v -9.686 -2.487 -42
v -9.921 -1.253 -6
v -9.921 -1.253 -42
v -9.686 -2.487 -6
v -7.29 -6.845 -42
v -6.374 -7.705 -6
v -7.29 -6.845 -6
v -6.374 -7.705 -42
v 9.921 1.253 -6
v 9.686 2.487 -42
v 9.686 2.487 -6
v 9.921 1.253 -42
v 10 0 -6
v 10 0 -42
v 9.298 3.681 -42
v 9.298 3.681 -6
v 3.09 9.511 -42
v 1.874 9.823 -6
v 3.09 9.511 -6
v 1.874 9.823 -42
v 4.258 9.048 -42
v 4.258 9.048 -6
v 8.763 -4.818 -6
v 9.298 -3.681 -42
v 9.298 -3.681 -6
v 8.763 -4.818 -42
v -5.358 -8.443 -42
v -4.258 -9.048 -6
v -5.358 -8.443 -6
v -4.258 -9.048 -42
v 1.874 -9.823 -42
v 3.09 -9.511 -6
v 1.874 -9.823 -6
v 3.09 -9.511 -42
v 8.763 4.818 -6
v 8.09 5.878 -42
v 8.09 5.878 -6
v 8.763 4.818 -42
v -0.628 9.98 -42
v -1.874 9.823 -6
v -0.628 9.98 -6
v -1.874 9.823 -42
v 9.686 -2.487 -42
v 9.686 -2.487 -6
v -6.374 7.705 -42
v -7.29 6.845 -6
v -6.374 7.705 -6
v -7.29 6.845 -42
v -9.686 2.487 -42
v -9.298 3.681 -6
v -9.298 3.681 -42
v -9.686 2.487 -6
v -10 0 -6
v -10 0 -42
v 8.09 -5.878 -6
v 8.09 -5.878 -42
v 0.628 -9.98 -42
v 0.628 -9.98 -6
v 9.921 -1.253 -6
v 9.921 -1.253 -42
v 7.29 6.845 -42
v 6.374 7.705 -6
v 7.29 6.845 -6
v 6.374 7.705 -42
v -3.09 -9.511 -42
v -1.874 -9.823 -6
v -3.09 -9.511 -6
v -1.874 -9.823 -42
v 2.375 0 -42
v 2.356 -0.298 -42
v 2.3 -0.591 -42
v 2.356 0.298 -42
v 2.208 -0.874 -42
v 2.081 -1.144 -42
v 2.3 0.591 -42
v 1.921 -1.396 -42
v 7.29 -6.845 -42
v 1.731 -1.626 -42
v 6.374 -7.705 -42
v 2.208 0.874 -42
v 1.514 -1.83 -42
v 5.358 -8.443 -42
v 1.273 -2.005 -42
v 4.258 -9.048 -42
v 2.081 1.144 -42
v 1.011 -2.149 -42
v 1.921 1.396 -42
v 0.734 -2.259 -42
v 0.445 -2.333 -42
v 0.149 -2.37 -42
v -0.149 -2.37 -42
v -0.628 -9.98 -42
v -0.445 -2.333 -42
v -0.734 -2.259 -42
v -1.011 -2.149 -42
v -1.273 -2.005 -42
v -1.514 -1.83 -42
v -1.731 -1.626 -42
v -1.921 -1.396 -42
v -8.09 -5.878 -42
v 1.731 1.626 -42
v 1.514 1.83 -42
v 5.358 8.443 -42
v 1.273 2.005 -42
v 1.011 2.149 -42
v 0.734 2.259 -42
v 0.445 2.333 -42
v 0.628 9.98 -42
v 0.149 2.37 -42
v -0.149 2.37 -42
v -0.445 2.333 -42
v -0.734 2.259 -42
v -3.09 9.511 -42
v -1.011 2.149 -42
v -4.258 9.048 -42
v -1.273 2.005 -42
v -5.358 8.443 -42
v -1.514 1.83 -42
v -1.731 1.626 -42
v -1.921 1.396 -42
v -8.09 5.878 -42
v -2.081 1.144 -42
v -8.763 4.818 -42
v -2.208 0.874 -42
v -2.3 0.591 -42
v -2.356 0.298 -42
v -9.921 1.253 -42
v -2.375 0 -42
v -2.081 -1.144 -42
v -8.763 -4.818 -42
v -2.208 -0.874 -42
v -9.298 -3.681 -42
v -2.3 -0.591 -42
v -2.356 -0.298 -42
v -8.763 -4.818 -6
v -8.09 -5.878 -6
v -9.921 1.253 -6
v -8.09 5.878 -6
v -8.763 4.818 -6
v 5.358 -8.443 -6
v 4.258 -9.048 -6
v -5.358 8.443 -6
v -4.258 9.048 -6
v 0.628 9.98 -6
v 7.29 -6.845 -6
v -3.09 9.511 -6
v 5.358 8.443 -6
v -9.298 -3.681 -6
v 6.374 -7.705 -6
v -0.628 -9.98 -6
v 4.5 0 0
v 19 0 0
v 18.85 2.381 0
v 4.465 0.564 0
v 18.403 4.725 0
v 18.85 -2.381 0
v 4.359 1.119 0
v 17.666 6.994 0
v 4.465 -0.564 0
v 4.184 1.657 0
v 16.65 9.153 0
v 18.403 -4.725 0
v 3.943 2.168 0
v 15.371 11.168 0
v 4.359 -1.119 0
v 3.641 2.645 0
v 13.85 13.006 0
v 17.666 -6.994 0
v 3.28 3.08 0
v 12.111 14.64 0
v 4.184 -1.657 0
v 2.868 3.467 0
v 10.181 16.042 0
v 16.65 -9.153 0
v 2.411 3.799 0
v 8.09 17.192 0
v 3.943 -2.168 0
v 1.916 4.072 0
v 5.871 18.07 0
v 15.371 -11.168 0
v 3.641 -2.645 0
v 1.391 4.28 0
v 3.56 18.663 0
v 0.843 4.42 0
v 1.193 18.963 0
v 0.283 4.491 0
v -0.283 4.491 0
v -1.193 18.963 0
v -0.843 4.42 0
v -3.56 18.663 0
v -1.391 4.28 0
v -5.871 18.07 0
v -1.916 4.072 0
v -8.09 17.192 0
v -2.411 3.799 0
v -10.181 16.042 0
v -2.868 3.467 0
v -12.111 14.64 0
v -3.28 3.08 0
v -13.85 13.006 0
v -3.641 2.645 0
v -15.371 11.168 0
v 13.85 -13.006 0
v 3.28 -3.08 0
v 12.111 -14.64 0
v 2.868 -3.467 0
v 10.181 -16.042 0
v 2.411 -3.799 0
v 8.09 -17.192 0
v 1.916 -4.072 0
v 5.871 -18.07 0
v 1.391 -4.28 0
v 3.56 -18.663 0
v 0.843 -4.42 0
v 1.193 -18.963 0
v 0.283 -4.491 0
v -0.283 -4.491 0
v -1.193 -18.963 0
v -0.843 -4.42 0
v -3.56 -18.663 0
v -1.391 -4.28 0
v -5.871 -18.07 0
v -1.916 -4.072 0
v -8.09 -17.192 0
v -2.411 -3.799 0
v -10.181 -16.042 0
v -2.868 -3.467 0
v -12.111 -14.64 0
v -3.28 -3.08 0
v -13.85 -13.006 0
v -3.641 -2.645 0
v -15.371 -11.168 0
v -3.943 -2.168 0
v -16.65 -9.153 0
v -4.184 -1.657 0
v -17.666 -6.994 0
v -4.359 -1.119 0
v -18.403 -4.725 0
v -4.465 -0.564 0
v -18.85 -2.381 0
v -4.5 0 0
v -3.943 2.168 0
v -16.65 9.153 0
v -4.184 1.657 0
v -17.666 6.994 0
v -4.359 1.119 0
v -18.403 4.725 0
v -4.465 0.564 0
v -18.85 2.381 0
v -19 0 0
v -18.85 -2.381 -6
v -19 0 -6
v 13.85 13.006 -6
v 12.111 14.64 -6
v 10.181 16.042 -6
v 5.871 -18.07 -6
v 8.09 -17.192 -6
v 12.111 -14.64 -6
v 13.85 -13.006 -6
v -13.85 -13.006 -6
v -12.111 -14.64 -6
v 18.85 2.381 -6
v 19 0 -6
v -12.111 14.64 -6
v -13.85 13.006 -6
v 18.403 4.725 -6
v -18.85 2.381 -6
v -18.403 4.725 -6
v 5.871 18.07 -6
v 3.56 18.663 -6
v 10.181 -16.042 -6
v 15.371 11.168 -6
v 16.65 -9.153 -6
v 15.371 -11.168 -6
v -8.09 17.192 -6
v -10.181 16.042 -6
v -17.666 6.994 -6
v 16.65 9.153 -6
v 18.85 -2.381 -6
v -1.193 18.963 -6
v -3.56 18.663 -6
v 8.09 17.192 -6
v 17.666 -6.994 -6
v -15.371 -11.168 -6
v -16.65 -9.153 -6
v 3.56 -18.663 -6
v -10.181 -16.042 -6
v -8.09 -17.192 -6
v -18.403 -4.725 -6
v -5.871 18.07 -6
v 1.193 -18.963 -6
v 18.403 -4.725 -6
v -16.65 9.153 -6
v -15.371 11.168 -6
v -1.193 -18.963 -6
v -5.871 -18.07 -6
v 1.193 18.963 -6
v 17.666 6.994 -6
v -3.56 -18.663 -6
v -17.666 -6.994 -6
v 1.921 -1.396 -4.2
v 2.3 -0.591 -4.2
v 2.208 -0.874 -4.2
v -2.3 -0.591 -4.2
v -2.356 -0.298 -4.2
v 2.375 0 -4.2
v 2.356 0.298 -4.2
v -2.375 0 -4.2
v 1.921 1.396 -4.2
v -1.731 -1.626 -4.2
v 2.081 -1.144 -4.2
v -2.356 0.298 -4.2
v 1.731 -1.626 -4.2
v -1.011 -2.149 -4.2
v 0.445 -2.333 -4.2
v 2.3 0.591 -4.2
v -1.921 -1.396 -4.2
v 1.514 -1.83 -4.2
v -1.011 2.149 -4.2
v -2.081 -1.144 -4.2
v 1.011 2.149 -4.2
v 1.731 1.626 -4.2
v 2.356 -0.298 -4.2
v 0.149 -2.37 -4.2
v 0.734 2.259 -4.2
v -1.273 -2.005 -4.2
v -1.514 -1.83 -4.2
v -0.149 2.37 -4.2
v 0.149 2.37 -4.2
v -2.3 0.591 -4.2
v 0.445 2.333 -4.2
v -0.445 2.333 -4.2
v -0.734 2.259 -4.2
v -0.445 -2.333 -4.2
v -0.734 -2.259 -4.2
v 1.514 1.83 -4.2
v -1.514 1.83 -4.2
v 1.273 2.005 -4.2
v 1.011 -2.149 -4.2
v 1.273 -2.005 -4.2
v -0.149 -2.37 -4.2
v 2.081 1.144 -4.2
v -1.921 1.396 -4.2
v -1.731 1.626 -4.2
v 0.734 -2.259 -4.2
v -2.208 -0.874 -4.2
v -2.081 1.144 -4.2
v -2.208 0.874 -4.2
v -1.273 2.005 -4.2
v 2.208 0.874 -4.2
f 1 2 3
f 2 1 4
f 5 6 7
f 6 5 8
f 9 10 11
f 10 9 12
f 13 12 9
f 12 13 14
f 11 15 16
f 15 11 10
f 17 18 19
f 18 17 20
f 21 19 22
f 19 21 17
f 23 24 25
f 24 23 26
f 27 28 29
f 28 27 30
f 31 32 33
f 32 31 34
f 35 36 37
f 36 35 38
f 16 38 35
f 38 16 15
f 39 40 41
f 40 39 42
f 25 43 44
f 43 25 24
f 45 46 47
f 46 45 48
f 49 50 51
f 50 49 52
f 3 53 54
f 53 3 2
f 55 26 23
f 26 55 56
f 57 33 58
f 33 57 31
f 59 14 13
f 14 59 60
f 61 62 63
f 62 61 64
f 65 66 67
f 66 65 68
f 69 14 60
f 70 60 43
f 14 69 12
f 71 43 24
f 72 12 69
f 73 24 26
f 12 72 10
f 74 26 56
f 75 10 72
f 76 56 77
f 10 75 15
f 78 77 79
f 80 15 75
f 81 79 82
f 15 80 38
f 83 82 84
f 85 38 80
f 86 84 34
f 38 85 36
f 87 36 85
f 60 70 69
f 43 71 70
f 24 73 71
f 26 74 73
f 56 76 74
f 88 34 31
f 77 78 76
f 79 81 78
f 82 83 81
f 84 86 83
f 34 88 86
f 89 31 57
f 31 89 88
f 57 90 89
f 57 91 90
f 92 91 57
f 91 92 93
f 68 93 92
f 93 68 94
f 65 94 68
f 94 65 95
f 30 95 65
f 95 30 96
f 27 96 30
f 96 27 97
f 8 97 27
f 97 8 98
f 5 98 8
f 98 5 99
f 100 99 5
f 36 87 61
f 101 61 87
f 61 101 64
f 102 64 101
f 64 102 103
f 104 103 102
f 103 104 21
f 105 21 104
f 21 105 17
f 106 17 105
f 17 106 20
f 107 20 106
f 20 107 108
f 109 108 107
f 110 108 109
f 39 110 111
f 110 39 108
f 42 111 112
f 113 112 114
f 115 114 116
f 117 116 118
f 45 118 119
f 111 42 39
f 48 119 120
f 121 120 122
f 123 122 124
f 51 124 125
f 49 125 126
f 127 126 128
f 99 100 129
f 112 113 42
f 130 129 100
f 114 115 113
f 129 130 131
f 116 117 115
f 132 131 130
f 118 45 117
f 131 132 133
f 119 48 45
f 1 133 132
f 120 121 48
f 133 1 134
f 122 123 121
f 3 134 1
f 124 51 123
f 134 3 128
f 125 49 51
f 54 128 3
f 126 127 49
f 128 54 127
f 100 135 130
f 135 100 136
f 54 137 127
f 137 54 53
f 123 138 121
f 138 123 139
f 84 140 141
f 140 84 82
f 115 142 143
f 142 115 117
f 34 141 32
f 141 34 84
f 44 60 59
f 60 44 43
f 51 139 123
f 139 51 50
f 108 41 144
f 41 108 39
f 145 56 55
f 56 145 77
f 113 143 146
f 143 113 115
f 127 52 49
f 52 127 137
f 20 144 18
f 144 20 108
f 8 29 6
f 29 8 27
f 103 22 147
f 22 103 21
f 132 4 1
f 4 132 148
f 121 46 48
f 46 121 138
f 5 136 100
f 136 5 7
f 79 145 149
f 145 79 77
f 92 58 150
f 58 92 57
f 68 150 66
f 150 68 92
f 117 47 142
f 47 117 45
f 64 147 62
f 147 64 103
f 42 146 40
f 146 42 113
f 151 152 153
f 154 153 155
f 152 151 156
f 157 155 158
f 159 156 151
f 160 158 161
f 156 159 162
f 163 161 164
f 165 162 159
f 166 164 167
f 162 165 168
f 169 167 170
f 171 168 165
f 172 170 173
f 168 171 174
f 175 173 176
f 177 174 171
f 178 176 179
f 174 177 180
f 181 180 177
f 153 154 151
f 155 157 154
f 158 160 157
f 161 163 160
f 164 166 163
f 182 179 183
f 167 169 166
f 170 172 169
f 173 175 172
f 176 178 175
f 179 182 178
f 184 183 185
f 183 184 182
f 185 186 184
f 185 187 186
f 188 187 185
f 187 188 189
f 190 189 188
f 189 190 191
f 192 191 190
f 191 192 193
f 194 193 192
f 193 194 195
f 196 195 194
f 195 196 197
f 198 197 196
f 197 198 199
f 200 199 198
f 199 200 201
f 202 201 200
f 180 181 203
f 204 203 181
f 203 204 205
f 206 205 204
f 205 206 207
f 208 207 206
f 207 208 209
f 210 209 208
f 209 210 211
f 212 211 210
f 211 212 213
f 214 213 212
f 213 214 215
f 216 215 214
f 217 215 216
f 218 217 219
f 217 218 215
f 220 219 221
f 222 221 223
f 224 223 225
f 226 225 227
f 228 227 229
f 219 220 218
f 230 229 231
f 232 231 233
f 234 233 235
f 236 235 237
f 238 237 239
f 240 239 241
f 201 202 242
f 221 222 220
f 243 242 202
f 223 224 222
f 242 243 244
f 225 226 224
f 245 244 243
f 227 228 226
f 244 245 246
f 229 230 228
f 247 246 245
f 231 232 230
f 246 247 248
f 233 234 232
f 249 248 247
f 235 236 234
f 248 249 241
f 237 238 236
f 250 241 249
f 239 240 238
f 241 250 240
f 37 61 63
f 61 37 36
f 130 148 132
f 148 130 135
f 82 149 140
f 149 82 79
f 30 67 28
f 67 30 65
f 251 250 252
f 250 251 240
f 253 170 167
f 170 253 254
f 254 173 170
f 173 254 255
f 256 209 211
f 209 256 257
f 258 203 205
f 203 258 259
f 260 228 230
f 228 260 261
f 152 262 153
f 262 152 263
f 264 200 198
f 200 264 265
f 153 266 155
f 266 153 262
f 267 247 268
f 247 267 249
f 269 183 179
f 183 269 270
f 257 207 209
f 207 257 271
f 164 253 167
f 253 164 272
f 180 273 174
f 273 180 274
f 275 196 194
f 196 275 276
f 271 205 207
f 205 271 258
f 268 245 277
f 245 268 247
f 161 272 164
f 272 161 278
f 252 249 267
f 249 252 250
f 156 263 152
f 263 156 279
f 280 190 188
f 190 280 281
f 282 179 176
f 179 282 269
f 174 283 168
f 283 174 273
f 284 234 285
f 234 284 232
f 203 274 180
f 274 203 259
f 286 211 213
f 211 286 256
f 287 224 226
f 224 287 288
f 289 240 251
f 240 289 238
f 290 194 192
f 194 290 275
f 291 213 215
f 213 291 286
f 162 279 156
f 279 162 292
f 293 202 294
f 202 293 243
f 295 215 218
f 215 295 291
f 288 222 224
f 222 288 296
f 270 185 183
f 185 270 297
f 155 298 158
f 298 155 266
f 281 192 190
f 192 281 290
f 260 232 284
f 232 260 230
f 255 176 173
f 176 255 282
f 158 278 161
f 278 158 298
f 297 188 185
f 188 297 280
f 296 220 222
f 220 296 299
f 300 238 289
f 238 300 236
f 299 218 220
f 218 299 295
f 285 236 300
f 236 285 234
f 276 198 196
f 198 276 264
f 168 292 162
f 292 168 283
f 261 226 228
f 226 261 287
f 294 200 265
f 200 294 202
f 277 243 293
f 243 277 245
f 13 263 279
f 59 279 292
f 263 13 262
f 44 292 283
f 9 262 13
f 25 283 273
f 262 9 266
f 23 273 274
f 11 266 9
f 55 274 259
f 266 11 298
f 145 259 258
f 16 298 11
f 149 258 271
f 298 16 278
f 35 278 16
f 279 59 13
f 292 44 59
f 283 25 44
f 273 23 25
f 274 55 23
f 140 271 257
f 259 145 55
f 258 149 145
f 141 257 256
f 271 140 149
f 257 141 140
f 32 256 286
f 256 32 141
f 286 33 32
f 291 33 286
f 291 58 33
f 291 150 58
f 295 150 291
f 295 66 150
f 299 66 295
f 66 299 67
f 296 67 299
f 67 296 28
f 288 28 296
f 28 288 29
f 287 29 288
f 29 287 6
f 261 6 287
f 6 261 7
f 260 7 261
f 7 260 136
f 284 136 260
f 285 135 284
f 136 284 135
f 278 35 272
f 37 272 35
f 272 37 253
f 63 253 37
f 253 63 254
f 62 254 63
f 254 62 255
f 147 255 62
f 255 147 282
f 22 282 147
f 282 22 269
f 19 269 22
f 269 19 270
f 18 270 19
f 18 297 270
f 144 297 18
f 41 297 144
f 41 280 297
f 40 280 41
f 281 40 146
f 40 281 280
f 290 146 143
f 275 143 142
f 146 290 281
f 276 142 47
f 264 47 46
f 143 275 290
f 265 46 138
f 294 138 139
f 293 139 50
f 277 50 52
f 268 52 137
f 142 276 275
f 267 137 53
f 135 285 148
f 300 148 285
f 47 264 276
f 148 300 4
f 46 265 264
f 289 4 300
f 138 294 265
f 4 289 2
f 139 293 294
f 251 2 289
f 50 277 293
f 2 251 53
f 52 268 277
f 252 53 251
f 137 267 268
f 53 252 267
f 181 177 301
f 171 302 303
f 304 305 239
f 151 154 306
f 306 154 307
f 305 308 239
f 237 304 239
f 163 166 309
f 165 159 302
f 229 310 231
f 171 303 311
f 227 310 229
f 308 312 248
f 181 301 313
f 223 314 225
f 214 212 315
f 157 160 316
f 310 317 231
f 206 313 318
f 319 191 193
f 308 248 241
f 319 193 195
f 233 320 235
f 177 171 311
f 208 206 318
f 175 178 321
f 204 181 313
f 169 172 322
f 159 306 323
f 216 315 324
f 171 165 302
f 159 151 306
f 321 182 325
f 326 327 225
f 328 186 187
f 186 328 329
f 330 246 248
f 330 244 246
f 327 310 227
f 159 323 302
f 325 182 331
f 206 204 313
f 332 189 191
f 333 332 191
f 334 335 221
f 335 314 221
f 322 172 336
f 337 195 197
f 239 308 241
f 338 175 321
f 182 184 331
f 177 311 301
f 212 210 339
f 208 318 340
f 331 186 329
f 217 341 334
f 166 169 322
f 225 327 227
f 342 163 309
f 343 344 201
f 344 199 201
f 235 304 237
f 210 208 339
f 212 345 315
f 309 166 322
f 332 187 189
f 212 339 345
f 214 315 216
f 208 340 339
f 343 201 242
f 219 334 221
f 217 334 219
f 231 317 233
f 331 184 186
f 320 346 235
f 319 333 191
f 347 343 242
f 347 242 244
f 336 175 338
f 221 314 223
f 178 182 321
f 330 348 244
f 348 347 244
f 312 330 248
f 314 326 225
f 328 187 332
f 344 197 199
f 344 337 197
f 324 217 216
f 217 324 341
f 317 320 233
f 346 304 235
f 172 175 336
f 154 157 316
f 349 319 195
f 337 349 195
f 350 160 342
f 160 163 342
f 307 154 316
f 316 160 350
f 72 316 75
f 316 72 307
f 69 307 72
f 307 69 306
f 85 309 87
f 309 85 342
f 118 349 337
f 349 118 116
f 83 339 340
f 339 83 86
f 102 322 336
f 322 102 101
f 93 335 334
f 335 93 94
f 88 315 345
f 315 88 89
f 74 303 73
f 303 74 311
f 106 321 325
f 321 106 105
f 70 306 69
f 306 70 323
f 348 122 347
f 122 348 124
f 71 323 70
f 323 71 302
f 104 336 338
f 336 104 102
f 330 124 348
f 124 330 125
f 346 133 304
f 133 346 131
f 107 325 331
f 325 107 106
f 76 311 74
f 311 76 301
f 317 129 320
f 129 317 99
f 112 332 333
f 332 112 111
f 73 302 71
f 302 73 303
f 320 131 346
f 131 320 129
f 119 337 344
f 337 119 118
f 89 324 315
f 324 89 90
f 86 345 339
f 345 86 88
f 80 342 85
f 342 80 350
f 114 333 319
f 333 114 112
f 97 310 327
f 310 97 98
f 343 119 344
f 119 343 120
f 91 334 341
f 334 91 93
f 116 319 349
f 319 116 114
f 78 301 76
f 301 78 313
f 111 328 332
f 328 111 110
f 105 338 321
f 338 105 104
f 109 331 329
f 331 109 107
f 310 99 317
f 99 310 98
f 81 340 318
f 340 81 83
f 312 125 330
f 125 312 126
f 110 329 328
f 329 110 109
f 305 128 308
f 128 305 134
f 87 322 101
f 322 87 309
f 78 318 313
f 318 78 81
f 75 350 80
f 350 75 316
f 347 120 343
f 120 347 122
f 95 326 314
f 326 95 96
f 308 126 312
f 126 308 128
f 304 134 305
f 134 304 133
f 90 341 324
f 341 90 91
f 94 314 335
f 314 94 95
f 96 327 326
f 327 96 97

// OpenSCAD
$fn = 50;


difference() {
	union() {
		translate(v = [0, 0, -42.0000000000]) {
			cylinder(h = 42, r = 10.0000000000);
		}
		translate(v = [0, 0, -6.0000000000]) {
			cylinder(h = 6, r = 19.0000000000);
		}
	}
	union() {
		translate(v = [0, 0, 0]) {
			rotate(a = [0, 0, 0]) {
				difference() {
					union() {
						#translate(v = [0, 0, -42.0000000000]) {
							cylinder(h = 42, r = 2.2500000000);
						}
						#translate(v = [0, 0, -4.2000000000]) {
							cylinder(h = 4.2000000000, r1 = 2.3750000000, r2 = 4.5000000000);
						}
						#translate(v = [0, 0, -42.0000000000]) {
							cylinder(h = 42, r = 2.3750000000);
						}
						#translate(v = [0, 0, -42.0000000000]) {
							cylinder(h = 42, r = 2.2500000000);
						}
					}
					union();
				}
			}
		}
	}
}
